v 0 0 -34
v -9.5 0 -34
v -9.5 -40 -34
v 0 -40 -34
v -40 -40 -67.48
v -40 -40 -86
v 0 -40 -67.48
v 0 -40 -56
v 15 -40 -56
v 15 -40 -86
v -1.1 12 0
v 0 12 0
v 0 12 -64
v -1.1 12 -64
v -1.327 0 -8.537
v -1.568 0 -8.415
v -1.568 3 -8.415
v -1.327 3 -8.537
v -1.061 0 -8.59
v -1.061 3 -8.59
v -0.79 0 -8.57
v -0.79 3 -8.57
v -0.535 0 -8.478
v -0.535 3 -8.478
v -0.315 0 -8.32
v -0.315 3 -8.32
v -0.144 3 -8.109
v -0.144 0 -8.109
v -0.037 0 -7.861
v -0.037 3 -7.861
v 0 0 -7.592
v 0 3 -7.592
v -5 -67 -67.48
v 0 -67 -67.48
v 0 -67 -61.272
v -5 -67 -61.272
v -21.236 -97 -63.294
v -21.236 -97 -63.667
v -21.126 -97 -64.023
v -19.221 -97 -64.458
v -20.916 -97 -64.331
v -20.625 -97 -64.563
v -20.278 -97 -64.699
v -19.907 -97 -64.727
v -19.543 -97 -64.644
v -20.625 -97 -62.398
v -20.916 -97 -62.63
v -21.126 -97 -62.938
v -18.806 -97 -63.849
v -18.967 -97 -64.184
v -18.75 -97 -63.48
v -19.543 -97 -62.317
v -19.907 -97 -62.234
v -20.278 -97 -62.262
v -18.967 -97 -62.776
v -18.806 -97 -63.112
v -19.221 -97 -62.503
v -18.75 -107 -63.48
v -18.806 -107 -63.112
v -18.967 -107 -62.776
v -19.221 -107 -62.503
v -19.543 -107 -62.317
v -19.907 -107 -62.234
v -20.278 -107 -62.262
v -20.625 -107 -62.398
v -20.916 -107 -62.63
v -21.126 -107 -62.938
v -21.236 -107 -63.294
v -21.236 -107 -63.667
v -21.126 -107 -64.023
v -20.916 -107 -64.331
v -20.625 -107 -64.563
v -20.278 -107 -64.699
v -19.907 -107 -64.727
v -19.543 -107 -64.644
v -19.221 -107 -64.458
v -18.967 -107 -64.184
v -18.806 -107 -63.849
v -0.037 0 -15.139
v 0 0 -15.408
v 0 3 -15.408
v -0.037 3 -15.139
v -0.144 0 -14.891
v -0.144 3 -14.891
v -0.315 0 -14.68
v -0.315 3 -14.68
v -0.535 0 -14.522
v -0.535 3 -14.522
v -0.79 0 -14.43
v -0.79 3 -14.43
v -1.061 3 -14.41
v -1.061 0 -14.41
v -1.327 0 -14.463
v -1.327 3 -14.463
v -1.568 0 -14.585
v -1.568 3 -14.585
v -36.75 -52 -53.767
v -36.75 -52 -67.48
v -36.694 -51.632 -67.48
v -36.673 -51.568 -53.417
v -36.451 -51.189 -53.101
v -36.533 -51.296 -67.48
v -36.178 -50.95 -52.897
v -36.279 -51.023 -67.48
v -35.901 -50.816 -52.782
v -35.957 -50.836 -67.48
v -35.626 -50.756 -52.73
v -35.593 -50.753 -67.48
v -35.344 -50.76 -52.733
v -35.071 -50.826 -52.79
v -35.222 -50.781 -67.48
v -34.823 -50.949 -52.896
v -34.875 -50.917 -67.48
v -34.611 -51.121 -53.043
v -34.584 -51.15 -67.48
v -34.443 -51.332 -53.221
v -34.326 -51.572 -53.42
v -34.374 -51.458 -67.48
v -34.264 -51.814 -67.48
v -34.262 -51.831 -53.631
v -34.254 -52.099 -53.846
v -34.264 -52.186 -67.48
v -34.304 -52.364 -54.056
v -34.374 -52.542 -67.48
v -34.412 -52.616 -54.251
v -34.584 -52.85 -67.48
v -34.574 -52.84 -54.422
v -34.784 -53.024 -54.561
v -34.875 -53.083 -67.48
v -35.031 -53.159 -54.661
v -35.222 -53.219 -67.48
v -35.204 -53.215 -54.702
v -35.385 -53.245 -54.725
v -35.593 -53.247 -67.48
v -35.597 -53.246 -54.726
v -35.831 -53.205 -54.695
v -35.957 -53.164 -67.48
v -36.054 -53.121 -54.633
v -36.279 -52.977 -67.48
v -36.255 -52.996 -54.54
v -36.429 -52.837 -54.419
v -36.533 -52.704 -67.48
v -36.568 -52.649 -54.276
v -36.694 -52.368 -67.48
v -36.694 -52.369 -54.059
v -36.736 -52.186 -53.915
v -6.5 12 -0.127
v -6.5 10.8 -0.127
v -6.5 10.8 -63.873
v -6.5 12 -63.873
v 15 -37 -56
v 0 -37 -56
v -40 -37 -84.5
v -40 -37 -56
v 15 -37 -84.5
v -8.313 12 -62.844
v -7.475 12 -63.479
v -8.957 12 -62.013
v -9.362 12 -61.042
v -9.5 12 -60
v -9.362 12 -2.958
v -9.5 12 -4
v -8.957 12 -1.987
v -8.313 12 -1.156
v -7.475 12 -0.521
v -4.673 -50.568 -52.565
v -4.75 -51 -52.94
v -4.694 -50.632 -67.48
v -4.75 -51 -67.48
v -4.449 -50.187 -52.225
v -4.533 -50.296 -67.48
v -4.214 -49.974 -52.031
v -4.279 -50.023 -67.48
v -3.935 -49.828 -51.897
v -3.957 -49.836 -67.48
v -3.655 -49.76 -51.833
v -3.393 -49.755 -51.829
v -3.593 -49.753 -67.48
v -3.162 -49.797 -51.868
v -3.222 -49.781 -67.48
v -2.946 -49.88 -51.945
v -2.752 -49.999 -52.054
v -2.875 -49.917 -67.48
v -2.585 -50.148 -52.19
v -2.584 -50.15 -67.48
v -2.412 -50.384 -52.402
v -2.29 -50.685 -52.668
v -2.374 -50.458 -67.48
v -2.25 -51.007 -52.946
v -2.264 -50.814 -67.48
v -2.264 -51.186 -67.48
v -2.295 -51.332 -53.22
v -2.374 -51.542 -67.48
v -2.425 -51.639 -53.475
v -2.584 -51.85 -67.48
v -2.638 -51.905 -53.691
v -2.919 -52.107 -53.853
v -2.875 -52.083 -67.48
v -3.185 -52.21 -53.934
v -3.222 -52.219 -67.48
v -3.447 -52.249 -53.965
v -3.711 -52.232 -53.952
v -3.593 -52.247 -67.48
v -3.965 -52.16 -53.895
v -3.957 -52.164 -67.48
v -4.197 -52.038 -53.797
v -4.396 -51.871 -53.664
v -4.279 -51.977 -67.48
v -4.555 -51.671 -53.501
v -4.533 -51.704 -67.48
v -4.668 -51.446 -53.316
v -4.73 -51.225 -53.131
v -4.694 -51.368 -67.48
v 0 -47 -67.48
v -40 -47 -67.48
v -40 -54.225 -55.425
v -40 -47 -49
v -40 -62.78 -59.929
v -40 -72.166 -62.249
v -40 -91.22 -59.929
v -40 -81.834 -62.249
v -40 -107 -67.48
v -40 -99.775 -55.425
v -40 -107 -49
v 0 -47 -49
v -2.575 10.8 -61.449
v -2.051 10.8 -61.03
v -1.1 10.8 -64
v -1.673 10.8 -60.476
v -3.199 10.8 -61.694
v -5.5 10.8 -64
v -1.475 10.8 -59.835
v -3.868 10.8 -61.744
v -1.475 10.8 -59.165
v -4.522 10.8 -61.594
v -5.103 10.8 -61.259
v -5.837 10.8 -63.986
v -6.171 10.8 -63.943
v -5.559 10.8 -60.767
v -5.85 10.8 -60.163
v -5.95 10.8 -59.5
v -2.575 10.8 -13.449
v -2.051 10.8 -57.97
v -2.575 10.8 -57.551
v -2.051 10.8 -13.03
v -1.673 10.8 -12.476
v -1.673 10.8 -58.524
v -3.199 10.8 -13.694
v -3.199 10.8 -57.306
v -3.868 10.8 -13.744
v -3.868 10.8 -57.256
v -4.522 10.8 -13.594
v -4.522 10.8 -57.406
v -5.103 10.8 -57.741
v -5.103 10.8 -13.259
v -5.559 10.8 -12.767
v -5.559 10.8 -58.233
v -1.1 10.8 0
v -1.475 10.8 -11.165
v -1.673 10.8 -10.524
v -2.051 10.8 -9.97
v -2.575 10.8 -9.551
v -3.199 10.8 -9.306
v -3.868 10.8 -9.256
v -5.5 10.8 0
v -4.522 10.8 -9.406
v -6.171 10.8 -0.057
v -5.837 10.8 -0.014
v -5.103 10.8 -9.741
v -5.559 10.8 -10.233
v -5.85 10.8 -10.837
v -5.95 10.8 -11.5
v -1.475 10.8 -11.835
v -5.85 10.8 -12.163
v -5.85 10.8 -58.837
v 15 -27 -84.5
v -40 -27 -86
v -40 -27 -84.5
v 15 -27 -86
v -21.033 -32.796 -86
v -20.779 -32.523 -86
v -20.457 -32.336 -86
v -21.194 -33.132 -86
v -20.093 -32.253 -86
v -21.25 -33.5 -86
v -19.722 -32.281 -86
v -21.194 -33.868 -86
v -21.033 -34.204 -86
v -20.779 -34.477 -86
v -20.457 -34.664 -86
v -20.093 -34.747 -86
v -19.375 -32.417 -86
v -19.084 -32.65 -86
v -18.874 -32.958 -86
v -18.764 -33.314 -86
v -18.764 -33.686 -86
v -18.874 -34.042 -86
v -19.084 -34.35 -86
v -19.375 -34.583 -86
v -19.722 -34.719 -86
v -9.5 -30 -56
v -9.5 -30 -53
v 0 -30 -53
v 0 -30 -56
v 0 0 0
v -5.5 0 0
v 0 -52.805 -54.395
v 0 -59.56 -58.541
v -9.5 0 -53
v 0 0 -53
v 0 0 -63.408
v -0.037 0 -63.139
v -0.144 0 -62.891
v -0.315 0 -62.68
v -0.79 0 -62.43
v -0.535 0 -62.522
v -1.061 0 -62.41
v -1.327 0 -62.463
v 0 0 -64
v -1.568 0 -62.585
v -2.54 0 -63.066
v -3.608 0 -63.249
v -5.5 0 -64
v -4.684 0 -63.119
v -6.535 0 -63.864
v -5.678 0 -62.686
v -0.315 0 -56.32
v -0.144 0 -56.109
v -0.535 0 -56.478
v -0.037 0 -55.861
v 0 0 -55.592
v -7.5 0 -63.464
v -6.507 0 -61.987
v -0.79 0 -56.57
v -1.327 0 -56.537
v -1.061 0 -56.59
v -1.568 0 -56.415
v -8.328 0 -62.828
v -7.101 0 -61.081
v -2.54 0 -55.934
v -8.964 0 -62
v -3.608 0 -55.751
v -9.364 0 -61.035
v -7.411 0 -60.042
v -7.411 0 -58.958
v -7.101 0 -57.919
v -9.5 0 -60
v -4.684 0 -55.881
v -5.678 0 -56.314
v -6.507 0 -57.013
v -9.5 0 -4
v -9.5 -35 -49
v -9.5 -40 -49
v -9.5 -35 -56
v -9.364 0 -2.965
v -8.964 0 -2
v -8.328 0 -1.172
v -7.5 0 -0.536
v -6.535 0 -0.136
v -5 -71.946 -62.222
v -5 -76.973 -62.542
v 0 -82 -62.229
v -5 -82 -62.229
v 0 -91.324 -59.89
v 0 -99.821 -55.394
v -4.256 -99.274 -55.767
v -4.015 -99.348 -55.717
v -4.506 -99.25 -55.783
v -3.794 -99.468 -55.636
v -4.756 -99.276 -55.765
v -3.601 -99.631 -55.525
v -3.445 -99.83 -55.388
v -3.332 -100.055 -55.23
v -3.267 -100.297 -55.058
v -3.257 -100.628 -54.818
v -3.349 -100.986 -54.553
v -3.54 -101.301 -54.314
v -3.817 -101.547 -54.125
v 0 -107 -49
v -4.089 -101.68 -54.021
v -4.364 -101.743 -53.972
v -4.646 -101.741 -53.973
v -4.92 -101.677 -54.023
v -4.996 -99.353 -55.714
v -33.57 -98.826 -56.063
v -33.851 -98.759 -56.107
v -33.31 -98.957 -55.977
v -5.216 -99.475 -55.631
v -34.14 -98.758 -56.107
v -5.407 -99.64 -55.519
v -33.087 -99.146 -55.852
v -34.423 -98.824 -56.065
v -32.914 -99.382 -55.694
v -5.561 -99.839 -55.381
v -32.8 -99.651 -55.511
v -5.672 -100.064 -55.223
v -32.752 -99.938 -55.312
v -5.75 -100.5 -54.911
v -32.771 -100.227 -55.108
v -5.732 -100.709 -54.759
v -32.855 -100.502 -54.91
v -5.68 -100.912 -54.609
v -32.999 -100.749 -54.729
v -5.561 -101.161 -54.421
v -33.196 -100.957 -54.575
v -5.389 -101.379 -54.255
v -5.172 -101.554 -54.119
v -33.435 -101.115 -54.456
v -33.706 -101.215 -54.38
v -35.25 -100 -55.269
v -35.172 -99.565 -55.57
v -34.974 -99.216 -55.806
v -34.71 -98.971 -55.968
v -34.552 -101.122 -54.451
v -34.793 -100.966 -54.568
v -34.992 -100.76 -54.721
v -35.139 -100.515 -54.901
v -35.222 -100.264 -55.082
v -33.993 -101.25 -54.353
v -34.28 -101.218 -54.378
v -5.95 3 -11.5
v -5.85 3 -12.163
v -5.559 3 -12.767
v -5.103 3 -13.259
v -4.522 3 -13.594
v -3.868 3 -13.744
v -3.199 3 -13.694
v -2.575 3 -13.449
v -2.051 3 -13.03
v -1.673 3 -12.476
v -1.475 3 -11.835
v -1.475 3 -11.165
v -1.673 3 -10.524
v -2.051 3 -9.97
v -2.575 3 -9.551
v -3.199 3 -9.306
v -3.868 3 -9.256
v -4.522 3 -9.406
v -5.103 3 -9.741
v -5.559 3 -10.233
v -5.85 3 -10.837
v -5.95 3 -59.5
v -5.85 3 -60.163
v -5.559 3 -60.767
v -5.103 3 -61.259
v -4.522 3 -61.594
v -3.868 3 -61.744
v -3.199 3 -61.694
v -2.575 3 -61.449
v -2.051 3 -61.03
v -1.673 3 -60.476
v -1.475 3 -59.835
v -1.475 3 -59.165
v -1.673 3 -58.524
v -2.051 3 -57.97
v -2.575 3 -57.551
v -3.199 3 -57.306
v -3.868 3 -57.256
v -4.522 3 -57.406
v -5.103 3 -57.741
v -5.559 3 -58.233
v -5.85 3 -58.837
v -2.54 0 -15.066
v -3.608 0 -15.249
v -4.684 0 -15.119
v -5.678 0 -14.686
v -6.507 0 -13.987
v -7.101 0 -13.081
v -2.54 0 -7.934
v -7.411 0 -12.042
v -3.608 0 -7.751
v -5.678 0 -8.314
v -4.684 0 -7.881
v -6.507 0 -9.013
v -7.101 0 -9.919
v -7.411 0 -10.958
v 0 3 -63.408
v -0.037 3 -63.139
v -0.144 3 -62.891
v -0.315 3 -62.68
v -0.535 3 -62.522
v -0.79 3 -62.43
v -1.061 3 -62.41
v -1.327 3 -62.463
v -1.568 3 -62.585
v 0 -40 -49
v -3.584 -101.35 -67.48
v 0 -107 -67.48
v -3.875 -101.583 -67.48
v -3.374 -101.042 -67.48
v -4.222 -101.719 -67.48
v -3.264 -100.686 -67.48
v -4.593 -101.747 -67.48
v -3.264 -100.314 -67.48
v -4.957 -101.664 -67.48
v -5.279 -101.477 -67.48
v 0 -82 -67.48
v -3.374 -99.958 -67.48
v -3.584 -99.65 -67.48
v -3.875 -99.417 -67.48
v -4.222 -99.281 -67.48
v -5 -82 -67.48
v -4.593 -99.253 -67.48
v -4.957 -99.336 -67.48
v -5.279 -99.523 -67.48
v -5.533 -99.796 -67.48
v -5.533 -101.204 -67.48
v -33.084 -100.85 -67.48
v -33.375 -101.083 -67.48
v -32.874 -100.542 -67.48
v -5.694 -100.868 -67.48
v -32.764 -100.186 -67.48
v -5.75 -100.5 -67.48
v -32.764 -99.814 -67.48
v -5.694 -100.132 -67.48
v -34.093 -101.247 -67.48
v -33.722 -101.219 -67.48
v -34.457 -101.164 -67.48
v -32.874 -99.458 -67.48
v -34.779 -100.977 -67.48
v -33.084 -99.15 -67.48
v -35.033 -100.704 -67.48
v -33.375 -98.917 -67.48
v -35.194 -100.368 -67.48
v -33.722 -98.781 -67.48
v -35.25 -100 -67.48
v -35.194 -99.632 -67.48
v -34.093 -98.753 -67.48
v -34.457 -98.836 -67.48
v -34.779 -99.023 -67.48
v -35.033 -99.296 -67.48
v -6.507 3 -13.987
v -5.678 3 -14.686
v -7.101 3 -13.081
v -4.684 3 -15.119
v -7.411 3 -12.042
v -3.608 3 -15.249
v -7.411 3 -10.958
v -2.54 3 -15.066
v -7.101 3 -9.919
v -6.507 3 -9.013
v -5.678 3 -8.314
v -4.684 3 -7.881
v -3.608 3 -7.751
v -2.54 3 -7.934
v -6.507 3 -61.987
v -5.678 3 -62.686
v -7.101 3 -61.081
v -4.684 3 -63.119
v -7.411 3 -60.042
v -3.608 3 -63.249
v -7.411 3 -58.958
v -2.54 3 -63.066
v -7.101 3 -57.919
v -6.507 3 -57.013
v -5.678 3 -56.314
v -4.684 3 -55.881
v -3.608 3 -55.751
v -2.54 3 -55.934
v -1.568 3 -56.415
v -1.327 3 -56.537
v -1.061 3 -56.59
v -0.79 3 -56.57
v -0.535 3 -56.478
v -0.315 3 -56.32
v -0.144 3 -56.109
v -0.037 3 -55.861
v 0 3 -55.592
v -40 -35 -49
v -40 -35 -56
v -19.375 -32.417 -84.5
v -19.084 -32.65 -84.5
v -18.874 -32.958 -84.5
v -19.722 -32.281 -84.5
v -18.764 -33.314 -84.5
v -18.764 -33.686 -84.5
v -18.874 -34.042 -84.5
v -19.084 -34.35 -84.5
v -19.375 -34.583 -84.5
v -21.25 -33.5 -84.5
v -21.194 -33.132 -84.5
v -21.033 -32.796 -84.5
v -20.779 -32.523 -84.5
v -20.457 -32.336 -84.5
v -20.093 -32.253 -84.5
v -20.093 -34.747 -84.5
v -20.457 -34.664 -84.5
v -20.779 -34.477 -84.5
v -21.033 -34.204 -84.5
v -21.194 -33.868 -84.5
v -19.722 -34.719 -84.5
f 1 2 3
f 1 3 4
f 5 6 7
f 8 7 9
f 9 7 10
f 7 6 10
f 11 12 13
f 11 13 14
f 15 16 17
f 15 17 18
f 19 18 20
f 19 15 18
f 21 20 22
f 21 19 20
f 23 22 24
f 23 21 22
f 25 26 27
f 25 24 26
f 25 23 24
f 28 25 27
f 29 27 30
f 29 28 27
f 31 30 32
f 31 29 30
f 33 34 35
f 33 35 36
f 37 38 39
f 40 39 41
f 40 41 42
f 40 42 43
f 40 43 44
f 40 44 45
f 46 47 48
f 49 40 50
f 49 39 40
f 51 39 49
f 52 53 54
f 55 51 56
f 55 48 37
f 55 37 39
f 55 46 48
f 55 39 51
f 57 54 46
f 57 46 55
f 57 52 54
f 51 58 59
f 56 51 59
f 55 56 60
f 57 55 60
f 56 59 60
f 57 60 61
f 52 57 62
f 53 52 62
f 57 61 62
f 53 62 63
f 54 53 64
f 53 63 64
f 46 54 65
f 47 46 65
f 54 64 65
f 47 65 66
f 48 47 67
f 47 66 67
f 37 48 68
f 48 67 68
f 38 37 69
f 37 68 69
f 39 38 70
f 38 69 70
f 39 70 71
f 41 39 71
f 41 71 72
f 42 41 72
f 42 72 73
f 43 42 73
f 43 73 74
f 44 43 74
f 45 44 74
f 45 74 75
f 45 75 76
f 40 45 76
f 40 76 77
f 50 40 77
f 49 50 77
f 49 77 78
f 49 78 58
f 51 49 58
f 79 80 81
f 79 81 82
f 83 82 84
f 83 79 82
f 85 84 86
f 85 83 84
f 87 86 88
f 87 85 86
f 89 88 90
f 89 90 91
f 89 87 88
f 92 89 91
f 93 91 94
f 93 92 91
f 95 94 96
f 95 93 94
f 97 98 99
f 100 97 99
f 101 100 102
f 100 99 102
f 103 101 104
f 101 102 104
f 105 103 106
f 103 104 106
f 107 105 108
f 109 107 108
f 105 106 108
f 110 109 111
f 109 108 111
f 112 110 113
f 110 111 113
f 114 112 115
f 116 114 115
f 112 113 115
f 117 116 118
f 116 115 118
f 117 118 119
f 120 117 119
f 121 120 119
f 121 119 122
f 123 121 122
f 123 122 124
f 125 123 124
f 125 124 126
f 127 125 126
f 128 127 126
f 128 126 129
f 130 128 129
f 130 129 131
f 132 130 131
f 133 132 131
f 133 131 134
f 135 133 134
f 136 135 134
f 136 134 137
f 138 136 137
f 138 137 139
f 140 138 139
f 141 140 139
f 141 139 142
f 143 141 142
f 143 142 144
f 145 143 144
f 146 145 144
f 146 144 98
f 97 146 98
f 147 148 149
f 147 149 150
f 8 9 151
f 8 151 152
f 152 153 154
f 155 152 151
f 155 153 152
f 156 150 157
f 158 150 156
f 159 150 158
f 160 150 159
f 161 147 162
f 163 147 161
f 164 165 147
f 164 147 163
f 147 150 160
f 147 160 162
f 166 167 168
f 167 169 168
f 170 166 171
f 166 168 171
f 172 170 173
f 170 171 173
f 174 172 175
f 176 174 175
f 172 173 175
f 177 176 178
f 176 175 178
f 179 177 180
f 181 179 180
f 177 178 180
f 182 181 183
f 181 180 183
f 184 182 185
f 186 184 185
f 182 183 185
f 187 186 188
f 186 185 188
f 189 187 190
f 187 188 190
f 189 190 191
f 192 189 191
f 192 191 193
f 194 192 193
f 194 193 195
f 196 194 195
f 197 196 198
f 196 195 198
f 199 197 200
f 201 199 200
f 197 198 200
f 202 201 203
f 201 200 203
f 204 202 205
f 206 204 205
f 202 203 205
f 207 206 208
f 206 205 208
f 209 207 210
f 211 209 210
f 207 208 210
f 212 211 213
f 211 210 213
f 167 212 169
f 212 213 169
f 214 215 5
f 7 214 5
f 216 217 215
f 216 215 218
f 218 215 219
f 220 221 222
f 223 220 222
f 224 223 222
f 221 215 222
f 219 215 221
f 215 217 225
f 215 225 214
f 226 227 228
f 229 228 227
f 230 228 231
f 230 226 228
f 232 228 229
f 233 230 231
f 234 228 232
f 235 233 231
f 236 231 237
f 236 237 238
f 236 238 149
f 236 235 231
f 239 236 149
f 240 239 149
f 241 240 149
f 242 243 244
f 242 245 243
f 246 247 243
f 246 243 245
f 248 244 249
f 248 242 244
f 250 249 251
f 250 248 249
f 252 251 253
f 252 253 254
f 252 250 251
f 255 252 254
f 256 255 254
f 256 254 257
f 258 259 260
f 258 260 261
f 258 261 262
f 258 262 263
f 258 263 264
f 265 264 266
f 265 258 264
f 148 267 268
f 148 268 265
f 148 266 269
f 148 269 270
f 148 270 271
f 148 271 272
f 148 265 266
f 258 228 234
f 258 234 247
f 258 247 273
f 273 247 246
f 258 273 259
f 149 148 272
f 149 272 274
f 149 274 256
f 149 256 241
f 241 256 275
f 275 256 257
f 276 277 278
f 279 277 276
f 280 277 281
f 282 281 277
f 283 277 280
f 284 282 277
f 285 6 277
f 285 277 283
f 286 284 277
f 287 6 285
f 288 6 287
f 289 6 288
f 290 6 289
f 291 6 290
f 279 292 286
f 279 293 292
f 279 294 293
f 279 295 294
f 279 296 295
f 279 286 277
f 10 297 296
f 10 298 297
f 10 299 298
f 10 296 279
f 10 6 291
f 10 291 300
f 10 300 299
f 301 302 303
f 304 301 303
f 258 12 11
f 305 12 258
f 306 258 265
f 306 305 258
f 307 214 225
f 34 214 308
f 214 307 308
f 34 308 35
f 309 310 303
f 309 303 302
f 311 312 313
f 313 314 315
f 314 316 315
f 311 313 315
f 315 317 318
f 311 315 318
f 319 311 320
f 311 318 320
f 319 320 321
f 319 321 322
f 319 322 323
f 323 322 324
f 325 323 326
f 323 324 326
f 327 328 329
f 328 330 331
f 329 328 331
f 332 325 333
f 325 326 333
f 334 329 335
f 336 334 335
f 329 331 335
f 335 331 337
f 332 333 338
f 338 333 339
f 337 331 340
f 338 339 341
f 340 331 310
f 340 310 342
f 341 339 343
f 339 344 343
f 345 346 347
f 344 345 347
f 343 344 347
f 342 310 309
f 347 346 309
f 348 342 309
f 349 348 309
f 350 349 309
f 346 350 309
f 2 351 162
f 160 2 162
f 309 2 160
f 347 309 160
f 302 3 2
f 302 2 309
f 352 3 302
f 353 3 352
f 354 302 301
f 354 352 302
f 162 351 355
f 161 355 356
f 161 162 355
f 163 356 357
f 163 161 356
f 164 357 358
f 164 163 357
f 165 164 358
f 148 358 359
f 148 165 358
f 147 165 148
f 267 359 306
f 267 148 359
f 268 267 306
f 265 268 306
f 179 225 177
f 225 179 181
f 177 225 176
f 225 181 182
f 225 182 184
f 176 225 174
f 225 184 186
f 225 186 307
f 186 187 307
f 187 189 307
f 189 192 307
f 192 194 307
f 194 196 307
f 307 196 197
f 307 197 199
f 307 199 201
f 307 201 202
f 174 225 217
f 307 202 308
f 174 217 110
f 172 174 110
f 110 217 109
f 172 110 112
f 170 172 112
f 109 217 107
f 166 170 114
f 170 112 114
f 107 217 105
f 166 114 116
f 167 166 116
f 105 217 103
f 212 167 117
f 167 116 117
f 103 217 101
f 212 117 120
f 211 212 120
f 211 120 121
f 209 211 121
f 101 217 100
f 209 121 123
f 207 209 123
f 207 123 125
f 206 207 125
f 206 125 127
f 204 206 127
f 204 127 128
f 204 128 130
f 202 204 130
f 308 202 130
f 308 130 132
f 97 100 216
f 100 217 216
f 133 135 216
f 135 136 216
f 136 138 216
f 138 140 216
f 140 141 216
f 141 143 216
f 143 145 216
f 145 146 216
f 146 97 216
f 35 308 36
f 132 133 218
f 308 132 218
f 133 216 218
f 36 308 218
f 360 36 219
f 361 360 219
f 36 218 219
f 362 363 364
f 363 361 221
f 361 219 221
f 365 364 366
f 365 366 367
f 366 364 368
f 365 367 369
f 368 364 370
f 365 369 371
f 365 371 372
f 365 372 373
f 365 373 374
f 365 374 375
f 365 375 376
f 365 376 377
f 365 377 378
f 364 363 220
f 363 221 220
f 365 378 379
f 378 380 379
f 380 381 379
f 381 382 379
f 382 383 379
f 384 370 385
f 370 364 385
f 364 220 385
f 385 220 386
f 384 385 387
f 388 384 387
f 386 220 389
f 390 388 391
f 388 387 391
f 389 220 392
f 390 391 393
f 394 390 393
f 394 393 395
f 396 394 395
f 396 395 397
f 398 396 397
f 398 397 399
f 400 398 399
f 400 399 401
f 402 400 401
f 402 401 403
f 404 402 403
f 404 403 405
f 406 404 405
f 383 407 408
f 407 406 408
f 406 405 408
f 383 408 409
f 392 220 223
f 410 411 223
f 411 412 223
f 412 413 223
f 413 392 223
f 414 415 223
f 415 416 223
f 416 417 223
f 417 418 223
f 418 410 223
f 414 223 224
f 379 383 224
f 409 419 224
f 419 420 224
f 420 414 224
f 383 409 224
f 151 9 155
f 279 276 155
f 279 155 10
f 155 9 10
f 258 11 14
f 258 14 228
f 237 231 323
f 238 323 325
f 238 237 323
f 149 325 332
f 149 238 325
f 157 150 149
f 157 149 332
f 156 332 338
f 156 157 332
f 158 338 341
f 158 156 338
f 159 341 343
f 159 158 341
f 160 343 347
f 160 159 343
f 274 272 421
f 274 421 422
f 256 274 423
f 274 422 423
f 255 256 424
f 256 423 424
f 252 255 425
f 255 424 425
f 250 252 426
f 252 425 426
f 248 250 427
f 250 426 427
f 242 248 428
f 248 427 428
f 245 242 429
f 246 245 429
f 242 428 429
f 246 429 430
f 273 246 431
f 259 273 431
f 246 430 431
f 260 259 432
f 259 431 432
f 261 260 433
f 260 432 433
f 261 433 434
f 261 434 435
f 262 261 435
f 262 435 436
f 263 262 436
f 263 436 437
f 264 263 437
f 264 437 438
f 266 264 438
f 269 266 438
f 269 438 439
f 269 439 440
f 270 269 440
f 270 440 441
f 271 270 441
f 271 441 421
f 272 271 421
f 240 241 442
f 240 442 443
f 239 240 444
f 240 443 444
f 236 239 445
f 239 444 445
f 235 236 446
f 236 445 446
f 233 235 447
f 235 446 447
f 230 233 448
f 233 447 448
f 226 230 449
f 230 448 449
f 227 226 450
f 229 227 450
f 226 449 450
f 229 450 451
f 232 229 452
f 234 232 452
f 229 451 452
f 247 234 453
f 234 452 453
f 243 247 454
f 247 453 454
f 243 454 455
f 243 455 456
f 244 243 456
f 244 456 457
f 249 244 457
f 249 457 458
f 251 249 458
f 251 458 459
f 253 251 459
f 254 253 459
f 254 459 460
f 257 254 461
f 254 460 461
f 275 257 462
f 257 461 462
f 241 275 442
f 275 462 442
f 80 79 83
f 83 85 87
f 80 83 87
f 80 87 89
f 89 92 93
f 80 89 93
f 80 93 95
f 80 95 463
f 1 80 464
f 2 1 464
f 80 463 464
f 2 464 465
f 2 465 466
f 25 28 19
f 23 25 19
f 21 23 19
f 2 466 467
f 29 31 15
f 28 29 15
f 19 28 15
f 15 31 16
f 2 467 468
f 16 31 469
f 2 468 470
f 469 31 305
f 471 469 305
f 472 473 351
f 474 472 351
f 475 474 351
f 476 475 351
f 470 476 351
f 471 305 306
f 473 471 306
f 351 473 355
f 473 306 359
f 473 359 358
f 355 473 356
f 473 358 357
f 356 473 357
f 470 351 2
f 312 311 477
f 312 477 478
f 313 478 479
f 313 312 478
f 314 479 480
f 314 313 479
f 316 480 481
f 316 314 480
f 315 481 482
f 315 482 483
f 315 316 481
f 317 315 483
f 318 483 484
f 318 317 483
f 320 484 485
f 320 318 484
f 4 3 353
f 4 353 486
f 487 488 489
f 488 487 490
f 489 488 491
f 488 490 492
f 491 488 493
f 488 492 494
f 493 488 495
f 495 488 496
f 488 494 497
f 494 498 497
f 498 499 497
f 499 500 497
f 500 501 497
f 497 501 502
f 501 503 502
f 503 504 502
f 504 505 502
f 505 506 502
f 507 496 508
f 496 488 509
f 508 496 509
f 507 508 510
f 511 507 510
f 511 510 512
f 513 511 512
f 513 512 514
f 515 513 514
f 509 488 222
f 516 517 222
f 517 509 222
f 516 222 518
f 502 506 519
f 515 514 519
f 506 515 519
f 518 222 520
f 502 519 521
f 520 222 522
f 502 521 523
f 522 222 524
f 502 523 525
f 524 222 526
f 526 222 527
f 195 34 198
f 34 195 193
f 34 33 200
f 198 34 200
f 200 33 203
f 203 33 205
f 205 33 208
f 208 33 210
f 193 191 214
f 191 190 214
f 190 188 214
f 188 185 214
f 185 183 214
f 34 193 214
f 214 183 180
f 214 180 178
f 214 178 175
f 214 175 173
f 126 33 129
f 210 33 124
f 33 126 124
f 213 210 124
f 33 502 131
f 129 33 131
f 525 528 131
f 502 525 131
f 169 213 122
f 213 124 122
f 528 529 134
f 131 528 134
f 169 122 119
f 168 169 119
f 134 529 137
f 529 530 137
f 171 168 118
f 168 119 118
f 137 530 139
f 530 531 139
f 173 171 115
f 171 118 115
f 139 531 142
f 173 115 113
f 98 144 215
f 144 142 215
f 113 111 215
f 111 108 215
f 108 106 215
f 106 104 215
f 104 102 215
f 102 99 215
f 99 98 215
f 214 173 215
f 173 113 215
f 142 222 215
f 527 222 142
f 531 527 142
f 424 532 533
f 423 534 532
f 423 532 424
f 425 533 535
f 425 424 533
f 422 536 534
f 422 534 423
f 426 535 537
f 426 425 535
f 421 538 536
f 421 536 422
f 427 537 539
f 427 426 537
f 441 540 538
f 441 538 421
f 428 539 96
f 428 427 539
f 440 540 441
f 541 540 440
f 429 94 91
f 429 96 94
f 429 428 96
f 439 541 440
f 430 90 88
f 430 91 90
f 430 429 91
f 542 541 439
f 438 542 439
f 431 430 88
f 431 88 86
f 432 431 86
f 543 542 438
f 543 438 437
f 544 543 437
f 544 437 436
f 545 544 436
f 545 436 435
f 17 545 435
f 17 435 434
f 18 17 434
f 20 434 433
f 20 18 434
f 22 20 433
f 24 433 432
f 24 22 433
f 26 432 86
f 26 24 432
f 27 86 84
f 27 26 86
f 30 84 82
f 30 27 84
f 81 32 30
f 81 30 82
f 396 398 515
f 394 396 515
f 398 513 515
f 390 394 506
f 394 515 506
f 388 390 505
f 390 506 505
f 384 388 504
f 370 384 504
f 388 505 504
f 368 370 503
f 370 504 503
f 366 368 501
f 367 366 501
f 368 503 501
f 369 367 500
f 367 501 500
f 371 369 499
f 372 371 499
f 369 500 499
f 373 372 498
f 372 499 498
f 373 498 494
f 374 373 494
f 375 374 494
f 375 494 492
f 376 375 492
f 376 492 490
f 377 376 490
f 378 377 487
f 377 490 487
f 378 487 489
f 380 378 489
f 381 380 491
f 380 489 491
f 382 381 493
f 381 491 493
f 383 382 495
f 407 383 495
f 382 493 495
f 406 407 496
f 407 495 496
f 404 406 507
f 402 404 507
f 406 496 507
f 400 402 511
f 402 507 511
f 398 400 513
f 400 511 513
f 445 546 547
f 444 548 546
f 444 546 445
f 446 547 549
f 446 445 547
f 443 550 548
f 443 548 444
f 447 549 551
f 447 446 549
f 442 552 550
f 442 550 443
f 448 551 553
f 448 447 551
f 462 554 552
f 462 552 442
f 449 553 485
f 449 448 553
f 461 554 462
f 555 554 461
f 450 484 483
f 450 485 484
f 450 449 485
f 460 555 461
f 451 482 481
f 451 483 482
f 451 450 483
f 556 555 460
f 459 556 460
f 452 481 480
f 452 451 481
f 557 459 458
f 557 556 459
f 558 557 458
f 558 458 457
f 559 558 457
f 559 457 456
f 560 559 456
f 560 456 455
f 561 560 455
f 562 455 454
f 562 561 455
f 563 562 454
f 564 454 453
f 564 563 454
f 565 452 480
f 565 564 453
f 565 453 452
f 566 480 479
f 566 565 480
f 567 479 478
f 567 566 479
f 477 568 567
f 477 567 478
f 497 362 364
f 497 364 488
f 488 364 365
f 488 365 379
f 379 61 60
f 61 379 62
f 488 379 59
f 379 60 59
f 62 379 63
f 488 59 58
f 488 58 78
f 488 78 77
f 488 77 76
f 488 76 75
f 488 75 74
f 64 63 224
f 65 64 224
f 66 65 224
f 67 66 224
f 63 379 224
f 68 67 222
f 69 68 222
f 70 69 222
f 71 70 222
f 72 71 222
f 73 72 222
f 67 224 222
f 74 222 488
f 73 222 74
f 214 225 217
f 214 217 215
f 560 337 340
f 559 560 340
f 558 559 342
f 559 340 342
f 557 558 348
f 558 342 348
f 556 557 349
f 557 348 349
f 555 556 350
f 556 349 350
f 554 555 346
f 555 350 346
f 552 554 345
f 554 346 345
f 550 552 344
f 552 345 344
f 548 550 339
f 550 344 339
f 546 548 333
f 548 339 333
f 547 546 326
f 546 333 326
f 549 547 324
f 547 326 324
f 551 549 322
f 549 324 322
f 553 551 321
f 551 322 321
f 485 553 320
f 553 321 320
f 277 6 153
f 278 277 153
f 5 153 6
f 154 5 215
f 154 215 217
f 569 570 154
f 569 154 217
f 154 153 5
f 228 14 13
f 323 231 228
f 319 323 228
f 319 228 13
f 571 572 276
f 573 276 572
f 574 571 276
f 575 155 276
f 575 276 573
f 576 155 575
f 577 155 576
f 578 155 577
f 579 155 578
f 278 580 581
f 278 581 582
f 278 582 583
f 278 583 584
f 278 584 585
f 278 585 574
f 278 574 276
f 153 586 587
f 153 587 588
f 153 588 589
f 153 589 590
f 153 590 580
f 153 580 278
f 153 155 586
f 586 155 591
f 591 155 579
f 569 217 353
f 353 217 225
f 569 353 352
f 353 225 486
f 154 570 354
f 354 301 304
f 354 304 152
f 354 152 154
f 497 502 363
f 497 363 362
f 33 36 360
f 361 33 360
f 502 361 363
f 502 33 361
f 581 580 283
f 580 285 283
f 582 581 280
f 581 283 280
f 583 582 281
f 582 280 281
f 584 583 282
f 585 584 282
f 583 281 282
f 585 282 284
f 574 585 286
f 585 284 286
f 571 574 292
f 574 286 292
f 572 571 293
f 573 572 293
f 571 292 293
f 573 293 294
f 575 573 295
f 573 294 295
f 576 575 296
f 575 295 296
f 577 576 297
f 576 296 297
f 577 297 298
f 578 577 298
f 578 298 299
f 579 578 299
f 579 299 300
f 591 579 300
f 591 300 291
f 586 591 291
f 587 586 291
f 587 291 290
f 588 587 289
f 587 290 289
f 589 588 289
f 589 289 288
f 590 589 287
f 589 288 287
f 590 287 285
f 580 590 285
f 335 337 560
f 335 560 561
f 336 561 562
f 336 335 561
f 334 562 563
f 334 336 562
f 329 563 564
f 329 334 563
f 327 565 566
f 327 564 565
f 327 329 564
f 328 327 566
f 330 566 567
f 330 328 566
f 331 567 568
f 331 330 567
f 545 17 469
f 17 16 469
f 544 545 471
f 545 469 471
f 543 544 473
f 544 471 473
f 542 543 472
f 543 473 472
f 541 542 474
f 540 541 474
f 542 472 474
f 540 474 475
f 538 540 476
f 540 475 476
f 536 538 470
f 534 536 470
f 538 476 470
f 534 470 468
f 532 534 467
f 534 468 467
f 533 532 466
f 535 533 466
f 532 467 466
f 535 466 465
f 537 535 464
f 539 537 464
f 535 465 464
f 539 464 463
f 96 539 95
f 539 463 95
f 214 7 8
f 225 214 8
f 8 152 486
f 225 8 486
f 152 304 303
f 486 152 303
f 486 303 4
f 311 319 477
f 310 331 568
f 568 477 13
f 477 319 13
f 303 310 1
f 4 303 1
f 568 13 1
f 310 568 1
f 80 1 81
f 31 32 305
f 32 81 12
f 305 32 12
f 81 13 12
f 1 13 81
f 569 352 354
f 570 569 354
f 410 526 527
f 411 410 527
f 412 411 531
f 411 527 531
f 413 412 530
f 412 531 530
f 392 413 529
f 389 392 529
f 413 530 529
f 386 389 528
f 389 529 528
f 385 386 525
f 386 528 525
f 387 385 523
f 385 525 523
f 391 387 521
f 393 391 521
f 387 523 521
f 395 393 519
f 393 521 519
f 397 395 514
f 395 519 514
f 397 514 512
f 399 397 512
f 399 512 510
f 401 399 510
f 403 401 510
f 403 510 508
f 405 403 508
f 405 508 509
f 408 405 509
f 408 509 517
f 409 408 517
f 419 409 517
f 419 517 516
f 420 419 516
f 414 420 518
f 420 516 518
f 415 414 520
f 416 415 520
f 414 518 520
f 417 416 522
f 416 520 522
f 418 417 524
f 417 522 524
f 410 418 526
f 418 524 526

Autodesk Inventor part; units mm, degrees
ref_plane "YZ Plane" through (0, 0, 0) normal (1, 0, 0) x (0, 1, 0)
ref_plane "XZ Plane" through (0, 0, 0) normal (0, 1, 0) x (-1, 0, 0)
ref_plane "XY Plane" through (0, 0, 0) normal (0, 0, 1) x (1, 0, 0)
sketch "Sketch1" plane through (0, 0, 0) normal (0, 1, 0) x (-1, 0, 0)
  line L0 (0, 0) -> (9.5, 0)
  line L1 (9.5, 0) -> (9.5, -64)
  line L2 (9.5, -64) -> (0, -64)
  line L3 (0, -64) -> (0, 0)
  circle A0 centre (3.7, -11.5) radius 2.25
  circle A1 centre (3.7, -59.5) radius 2.25
  line L4 (3.7, -11.5) -> (3.7, -59.5) construction
  dimension "d1" = 9.5
  dimension "d2" = 64
  dimension "d3" = 4.5
  dimension "d4" = 48
  dimension "d6" = 3.7
  dimension "d17" = 4.5
extrude "Extrusion1" add sketch "Sketch1" along normal blind 12
sketch "Sketch2" plane through (-9.5, 0, 0) normal (0, 0, 1) x (1, 0, 0)
  line L0 (9.5, 12) -> (0, 12) projected
  line L1 (3, 12) -> (8.4, 12)
  line L2 (8.4, 12) -> (8.4, 10.8)
  line L3 (8.4, 10.8) -> (3, 10.8)
  line L4 (3, 10.8) -> (3, 12)
  line L5 (9.5, 0) -> (9.5, 12) projected
  line L6 (3.55, 0) -> (8.05, 0) projected
  line L7 (3.55, 12) -> (8.05, 12) projected
  line L8 (9.5, 0) -> (9.5, 12) projected
  line L9 (9.5, 0) -> (9.5, 12) projected
  line L10 (3.55, 12) -> (8.05, 12) projected
  line L11 (3.55, 12) -> (3.55, 0) projected
  line L12 (3.55, 12) -> (8.05, 12) projected
  line L13 (3.55, 0) -> (8.05, 0) projected
  line L14 (3.55, 12) -> (8.05, 12) projected
  line L15 (3.55, 0) -> (8.05, 0) projected
  line L16 (3.55, 12) -> (8.05, 12) projected
  line L17 (3.55, 0) -> (8.05, 0) projected
  dimension "d9" = 1.1
  dimension "d10" = 5.4
  dimension "d11" = 1.2
  dimension "d76" = 12
extrude "Extrusion2" cut sketch "Sketch2" against normal up to next
sketch "Sketch3" plane through (0, 0, 0) normal (0, -1, 0) x (1, 0, 0)
  circle A0 centre (-3.7, -11.5) radius 2.25 projected
  circle A1 centre (-3.7, -11.5) radius 3.75
  circle A2 centre (-3.7, -59.5) radius 2.25 projected
  circle A3 centre (-3.7, -59.5) radius 3.75
  point P0 (0, 0)
  dimension "d14" = 7.5
extrude "Extrusion3" cut sketch "Sketch3" against normal blind 3
fillet "Fillet1" radius 1 4 edges at (0, 1.5, -58.8897) (0, 1.5, -60.1103) (0, 1.5, -10.8897) (0, 1.5, -12.1103)
fillet "Fillet2" radius 4 2 edges at (-9.5, 6, -64) (-9.5, 6, 0)
sketch "Sketch28" plane through (0, 0, 0) normal (0, -1, 0) x (1, 0, 0)
  arc A0 (-1.5684, -56.4147) -> (0, -55.592) centre (-1, -55.592) ccw projected
  line L0 (0, -55.592) -> (0, -53)
  line L1 (0, -15.408) -> (0, -55.592) projected
  line L2 (-9.5, -60) -> (-9.5, -4) projected
  line L3 (0, -53) -> (-9.5, -53)
  line L4 (-9.5, -53) -> (-9.5, -34)
  line L5 (-9.5, -34) -> (0, -34)
  line L6 (0, -34) -> (0, -53)
  point P0 (0, 0)
  point P1 (0, -34)
  dimension "d107" = 2.592
  dimension "d108" = 19
extrude "Extrusion19" add sketch "Sketch28" along normal blind 30
sketch "Sketch40" plane through (0, -30, 0) normal (0, -1, 0) x (1, 0, 0)
  line L0 (0, -53) -> (-9.5, -53) projected
  line L1 (-9.5, -53) -> (-9.5, -56)
  line L2 (-9.5, -56) -> (0, -56)
  line L3 (0, -56) -> (0, -34)
  line L4 (0, 0) -> (0, -64) projected
  line L5 (0, -34) -> (-9.5, -34)
  line L6 (-9.5, -34) -> (-9.5, -53)
  line L7 (-9.5, -34) -> (0, -34)
  line L8 (0, -34) -> (0, -56)
  line L9 (0, -56) -> (-9.5, -56)
  line L10 (-9.5, -56) -> (-9.5, -34)
  dimension "d130" = 3
  dimension "d131" = 22
extrude "Extrusion21" add sketch "Sketch40" along normal blind 10
sketch "Sketch41" plane through (0, 0, -53) normal (0, 0, -1) x (-1, 0, 0)
  point P0 (0, 0)
sketch "Sketch42" plane through (0, -40, 0) normal (0, -1, 0) x (1, 0, 0)
  line L0 (-9.5, -56) -> (0, -56) projected
  line L1 (-9.5, -56) -> (-40, -56)
  line L2 (-9.5, -56) -> (21, -56) construction
  line L3 (-40, -56) -> (-40, -49)
  line L4 (-40, -49) -> (0, -49)
  line L5 (0, -49) -> (0, -56)
  line L6 (0, -56) -> (-9.5, -56)
  point P0 (0, 0)
  point P1 (0, -56)
  dimension "d134" = 30.5
  dimension "d135" = 180
  dimension "d136" = 7
  dimension "d137" = 40
  dimension "d138" = 7
extrude "Extrusion22" add sketch "Sketch42" along normal blind 7
sketch "Sketch54" plane through (-40, -40, -56) normal (-1, 0, 0) x (0, 0, 1)
  arc A0 (7, -7) -> (7, -57) centre (31.4949, -32) ccw projected
  line L0 (-6.4428, -57) -> (19.2704, -57)
  line L1 (19.2704, -57) -> (19.2704, -74.6848)
  line L2 (19.2704, -74.6848) -> (-6.4428, -74.6848)
  line L3 (-6.4428, -74.6848) -> (-6.4428, -57)
  point P0 (56, 40)
extrude "Extrusion25" cut sketch "Sketch54" against normal blind 104.3
sketch "Sketch56" plane through (0, -47, 0) normal (0, -1, 0) x (1, 0, 0)
  line L0 (-40, -56) -> (0, -56) projected
  line L1 (0, -56) -> (0, -49) projected
  line L2 (-40, -56) -> (0, -56)
  line L3 (0, -56) -> (0, -49)
  line L4 (0, -49) -> (-40, -49)
  line L5 (-40, -49) -> (-40, -56)
  point P0 (0, 0)
  point P1 (9.3, -58)
sketch "Sketch58" plane through (-40, -40, -56) normal (-1, 0, 0) x (0, 0, 1)
  arc A0 (7, -7) -> (7, -67) centre (33.4575, -37) ccw
  point P0 (56, 40)
  dimension "d164" = 60
  dimension "d165" = 40
sweep "Sweep4" add profiles "Sketch56" path "Sketch58" separate body
sketch "Sketch59" plane through (-40, -47, -56) normal (-1, 0, 0) x (0, 0, 1)
  line L0 (7.875, -66.9451) -> (7, -60) projected
  line L1 (7, -60) -> (-3.876, -60)
  line L2 (-3.876, -60) -> (-3.876, -70.2842)
  line L3 (-3.876, -70.2842) -> (7, -70.2842)
  line L4 (7, -70.2842) -> (7, -60)
  line L5 (-3.876, -60) -> (12.796, -60)
  line L6 (12.796, -60) -> (12.796, -72.0421)
  line L7 (12.796, -72.0421) -> (-3.876, -72.0421)
  line L8 (-3.876, -72.0421) -> (-3.876, -60)
  point P0 (56, 47)
  point P1 (7, -60)
extrude "Extrusion26" cut sketch "Sketch59" against normal blind 63.025 bodies 2
sketch "Sketch60" plane through (0, -40, 0) normal (0, 1, 0) x (1, 0, 0)
  point P0 (0, 0)
sketch "Sketch61" plane through (-40, -47, -56) normal (-1, 0, 0) x (0, 0, 1)
  arc A0 (0, 0) -> (0, -60) centre (33.4575, -30) ccw projected
  line L0 (-11.4803, -30) -> (-11.4803, 0)
  line L1 (-11.4803, 0) -> (0, 0)
  line L2 (-11.4803, -30) -> (-11.4803, -60)
  line L3 (-11.4803, -60) -> (0, -60)
  arc A1 (0, 0) -> (0, -60) centre (33.4575, -30) ccw
  point P0 (56, 47)
extrude "Extrusion27" add sketch "Sketch61" against normal blind 40 bodies 2
sketch "Sketch62" plane through (-40, -47, -49) normal (0, 1, 0) x (1, 0, 0)
  point P0 (40, -49)
sketch "Sketch63" plane through (-40, -40, -56) normal (-1, 0, 0) x (0, 0, 1)
  line L0 (0, 10) -> (0, -7) projected
  line L1 (0, -7) -> (-11.4803, -7)
  line L2 (-11.4803, -7) -> (-11.4803, 0)
  line L3 (-11.4803, 0) -> (0, 0)
  line L4 (0, 0) -> (0, -7)
  point P0 (56, 40)
  point P1 (0, 0)
  dimension "d172" = 7
extrude "Extrusion28" add sketch "Sketch63" against normal blind 40 bodies 1
sketch "Sketch64" plane through (0, -40, 0) normal (0, 1, 0) x (1, 0, 0)
  point P0 (0, 0)
sketch "Sketch65" plane through (-40, -107, -67.4803) normal (0, 0, -1) x (-1, 0, 0)
  line L0 (-40, 0) -> (-40, 60) projected
  line L1 (-40, 25) -> (-40, 40)
  line L2 (-40, 40) -> (-35, 40)
  line L3 (-35, 40) -> (-35, 25)
  line L4 (-35, 25) -> (-40, 25)
  point P0 (-40, 107)
  point P1 (0, 0)
  dimension "d179" = 15
  dimension "d180" = 5
  dimension "d181" = 15
extrude "Extrusion29" cut sketch "Sketch65" against normal blind 20.95 bodies 2
sketch "Sketch66" plane through (0, -107, -49) normal (1, 0, 0) x (0, 0, -1)
  point P0 (-49, 107)
sketch "Sketch67" plane through (-40, -47, -67.4803) normal (0, 0, -1) x (-1, 0, 0)
  point P0 (-40, 47)
sketch "Sketch68" plane through (0, -40, 0) normal (0, 1, 0) x (1, 0, 0)
  line L0 (0, 56) -> (-9.5, 56) projected
  line L1 (15, 56) -> (-40, 56)
  line L2 (-40, 67.4803) -> (0, 67.4803) projected
  line L3 (15, 56) -> (-40, 56)
  line L4 (-40, 56) -> (-40, 86)
  line L5 (-40, 86) -> (15, 86)
  line L6 (15, 86) -> (15, 56)
  point P0 (0, 0)
  dimension "d184" = 15
  dimension "d187" = 30
extrude "Extrusion30" add sketch "Sketch68" along normal blind 3 bodies 1
sketch "Sketch69" plane through (0, -40, 0) normal (0, 1, 0) x (1, 0, 0)
  line L0 (-40, 49) -> (-40, 56) projected
  line L1 (-9.5, 49) -> (-9.5, 56) projected
  line L2 (-40, 49) -> (-9.5, 49)
  line L3 (-9.5, 49) -> (-9.5, 56)
  line L4 (-9.5, 56) -> (-40, 56)
  line L5 (-40, 56) -> (-40, 49)
  point P0 (0, 0)
extrude "Extrusion31" add sketch "Sketch69" along normal blind 3 bodies 1
sketch "Sketch70" plane through (0, -37, 0) normal (0, 1, 0) x (1, 0, 0)
  line L0 (15, 56) -> (15, 86) projected
  line L1 (-40, 86) -> (15, 86)
  line L2 (15, 86) -> (15, 84.5)
  line L3 (15, 84.5) -> (-40, 84.5)
  line L4 (-40, 84.5) -> (-40, 86)
  point P0 (0, 0)
  dimension "d192" = 1.5
extrude "Extrusion32" add sketch "Sketch70" along normal blind 10 bodies 1
sketch "Sketch72" plane through (-40, -107, -67.4803) normal (0, 0, -1) x (-1, 0, 0)
  line L0 (0, 60) -> (0, 0) projected
  line L1 (0, 0) -> (-1, 0)
  line L2 (-1, 0) -> (-1, 3)
  line L3 (-1, 3) -> (0, 3)
  line L4 (0, 3) -> (0, 0)
  line L5 (-1, 3) -> (-39, 3)
  line L6 (-39, 3) -> (-39, 59)
  line L7 (-39, 59) -> (-1, 59)
  line L8 (-1, 59) -> (-1, 3)
  line L9 (-1, 3) -> (-6, 3)
  line L10 (-6, 3) -> (-6, 7)
  line L11 (-6, 7) -> (-1, 7)
  line L12 (-1, 7) -> (-1, 3)
  circle A0 centre (-6, 7) radius 1.25
  line L13 (-1, 59) -> (-4.5, 59)
  line L14 (-4.5, 59) -> (-4.5, 55)
  line L15 (-4.5, 55) -> (-1, 55)
  line L16 (-1, 55) -> (-1, 59)
  circle A1 centre (-4.5, 55) radius 1.25
  line L17 (-39, 59) -> (-36.5, 59)
  line L18 (-36.5, 59) -> (-36.5, 56)
  line L19 (-36.5, 56) -> (-39, 56)
  line L20 (-39, 56) -> (-39, 59)
  circle A2 centre (-36.5, 56) radius 1.25
  line L21 (-39, 3) -> (-35.5, 3)
  line L22 (-35.5, 3) -> (-35.5, 6.5)
  line L23 (-35.5, 6.5) -> (-39, 6.5)
  line L24 (-39, 6.5) -> (-39, 3)
  circle A3 centre (-35.5, 6.5) radius 1.25
  point P0 (-40, 107)
  dimension "d195" = 1
  dimension "d196" = 3
  dimension "d197" = 38
  dimension "d198" = 56
  dimension "d199" = 5
  dimension "d200" = 4
  dimension "d201" = 2.5
  dimension "d202" = 3.5
  dimension "d203" = 4
  dimension "d204" = 2.5
  dimension "d205" = 2.5
  dimension "d206" = 3
  dimension "d207" = 2.5
  dimension "d208" = 3.5
  dimension "d209" = 3.5
  dimension "d210" = 2.5
extrude "Extrusion33" cut sketch "Sketch72" against normal blind 71.9125 contours A0 L11 L10 | L10 L11 A0 | A3 L23 L22 | L22 L23 A3 | A1 L14 L15 | L15 L14 A1 | A2 L18 L19 | L19 L18 A2 bodies 2
sketch "Sketch73" plane through (-9.5, 0, -4) normal (-1, 0, 0) x (0, 0, 1)
  line L0 (-52, -37) -> (-52, -40) projected
  line L1 (-52, -37) -> (-45, -37)
  line L2 (-45, -37) -> (-45, -35)
  line L3 (-45, -35) -> (-52, -35)
  line L4 (-52, -35) -> (-52, -37)
  point P0 (4, 0)
  dimension "d213" = 7
  dimension "d214" = 2
extrude "Extrusion34" add sketch "Sketch73" along normal blind 30.5 bodies 1
sketch "Sketch74" plane through (-40, -107, -49) normal (0, -1, 0) x (1, 0, 0)
  line L0 (40, 0) -> (0, 0) projected
  line L1 (0, 0) -> (0, -18.4803) projected
  line L2 (0, -18.4803) -> (40, -18.4803) projected
  line L3 (0, -18.4803) -> (40, -18.4803)
  circle A0 centre (20, -14.4803) radius 1.25
  point P0 (40, 49)
  dimension "d218" = 2.5
extrude "Extrusion35" cut sketch "Sketch74" against normal blind 10 bodies 2
sketch "Sketch75" plane through (15, -40, -86) normal (0, 0, -1) x (-1, 0, 0)
  line L0 (55, 13) -> (0, 13) projected
  line L1 (55, 0) -> (55, 13) projected
  line L2 (55, 6.5) -> (35, 6.5)
  circle A0 centre (35, 6.5) radius 1.25
  point P0 (15, 40)
  dimension "d221" = 20
  dimension "d222" = 2.5
extrude "Extrusion36" cut sketch "Sketch75" against normal blind 10 bodies 1
properties part number "Back"
